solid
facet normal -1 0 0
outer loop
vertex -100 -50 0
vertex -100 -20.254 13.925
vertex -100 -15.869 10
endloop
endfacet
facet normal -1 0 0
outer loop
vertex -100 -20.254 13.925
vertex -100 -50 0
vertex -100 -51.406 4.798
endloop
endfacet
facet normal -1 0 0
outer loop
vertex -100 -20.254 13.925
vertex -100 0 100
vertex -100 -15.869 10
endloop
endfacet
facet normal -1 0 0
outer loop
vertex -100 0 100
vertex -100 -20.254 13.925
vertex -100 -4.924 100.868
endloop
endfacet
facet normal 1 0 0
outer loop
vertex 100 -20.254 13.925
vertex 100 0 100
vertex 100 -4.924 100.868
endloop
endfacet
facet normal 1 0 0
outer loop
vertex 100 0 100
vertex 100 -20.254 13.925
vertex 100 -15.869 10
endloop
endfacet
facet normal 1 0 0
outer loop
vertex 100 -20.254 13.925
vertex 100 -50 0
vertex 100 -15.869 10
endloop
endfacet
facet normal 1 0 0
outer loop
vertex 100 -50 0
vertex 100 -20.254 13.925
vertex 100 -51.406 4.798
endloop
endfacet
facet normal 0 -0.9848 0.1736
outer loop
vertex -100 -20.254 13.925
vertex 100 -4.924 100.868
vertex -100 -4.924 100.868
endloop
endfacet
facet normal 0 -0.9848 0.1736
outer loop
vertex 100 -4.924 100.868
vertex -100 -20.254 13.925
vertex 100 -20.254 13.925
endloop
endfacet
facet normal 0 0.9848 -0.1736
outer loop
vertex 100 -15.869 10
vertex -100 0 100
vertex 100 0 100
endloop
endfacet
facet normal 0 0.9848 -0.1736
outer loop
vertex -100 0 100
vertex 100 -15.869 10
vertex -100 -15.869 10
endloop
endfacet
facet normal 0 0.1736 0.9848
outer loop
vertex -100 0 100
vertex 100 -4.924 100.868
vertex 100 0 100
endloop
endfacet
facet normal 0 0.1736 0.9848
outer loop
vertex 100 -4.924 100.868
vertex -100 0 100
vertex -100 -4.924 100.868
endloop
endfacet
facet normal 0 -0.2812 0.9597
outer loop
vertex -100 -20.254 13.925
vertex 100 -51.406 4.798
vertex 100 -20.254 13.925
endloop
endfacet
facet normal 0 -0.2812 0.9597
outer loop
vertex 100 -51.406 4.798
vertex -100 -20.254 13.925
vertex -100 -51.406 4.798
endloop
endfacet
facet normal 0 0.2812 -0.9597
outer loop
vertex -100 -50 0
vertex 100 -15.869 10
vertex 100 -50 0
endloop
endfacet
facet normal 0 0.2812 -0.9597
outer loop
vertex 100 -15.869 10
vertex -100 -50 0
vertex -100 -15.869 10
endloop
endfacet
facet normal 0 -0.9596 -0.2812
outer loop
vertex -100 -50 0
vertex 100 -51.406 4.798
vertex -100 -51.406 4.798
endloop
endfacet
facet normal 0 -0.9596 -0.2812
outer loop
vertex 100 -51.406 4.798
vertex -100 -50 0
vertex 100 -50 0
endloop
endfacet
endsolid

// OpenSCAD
//Rampa

module rampa(inclinacion1=80,profundidad=40,ancho=200,alto=100,lonRampa2=20,grosor=5,porCientoRampa=0.1){

	lon1=(1-porCientoRampa)*alto/sin(inclinacion1);
	prof1=(1-porCientoRampa)*alto/tan(inclinacion1);
	

	lon2=sqrt(pow((porCientoRampa*alto),2)+pow((profundidad-prof1),2));
	a2=sqrt(pow(lon2,2)-pow(porCientoRampa*alto,2));
	inclinacion2=asin(porCientoRampa*alto/lon2);
	a1=lon1*cos(inclinacion1);
	translate([0,-a1,0]) union(){
		translate([-ancho/2,0,alto*porCientoRampa]) rotate([inclinacion1,0,0]) cube([ancho,lon1,grosor]);
	
		translate([-ancho/2,-a2,0]) rotate([inclinacion2,0,0]) cube([ancho,lon2,grosor]);
	}
}

rampa(inclinacion1=80,profundidad=50,alto=100,porCientoRampa=0.1);
